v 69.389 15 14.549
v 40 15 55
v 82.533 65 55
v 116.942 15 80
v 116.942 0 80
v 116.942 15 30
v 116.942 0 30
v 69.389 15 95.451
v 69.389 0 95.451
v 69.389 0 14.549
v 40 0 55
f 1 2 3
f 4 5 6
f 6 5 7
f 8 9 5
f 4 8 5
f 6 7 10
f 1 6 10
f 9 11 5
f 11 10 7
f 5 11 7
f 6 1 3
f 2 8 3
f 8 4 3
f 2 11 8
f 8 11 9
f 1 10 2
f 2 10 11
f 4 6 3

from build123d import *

# Parameters (mm, degrees)
EXTRUDE1_DEPTH = 15


with BuildPart() as part:
    # Sketch1 → Extrude1 (new body)
    with BuildSketch(Plane(origin=(0, 0, 0), x_dir=(1, 0, 0), z_dir=(0, 1, 0))):
        Polygon((69.389262615, -95.450849719), (116.942088429, -80), (116.942088429, -30), (69.389262615, -14.549150281), (40, -55), align=None)
    extrude(amount=EXTRUDE1_DEPTH)

    # Sketch3 → Loft1 section 0
    with BuildSketch(Plane(origin=(0, 15, 0), x_dir=(1, 0, 0), z_dir=(0, 1, 0)), mode=Mode.PRIVATE) as loft1_s0:
        Polygon((69.389262615, -95.450849719), (40, -55), (69.389262615, -14.549150281), (116.942088429, -30), (116.942088429, -80), align=None)
    loft([loft1_s0.sketch, Vertex(82.532540418, 65, 55)])


solid = part.part
